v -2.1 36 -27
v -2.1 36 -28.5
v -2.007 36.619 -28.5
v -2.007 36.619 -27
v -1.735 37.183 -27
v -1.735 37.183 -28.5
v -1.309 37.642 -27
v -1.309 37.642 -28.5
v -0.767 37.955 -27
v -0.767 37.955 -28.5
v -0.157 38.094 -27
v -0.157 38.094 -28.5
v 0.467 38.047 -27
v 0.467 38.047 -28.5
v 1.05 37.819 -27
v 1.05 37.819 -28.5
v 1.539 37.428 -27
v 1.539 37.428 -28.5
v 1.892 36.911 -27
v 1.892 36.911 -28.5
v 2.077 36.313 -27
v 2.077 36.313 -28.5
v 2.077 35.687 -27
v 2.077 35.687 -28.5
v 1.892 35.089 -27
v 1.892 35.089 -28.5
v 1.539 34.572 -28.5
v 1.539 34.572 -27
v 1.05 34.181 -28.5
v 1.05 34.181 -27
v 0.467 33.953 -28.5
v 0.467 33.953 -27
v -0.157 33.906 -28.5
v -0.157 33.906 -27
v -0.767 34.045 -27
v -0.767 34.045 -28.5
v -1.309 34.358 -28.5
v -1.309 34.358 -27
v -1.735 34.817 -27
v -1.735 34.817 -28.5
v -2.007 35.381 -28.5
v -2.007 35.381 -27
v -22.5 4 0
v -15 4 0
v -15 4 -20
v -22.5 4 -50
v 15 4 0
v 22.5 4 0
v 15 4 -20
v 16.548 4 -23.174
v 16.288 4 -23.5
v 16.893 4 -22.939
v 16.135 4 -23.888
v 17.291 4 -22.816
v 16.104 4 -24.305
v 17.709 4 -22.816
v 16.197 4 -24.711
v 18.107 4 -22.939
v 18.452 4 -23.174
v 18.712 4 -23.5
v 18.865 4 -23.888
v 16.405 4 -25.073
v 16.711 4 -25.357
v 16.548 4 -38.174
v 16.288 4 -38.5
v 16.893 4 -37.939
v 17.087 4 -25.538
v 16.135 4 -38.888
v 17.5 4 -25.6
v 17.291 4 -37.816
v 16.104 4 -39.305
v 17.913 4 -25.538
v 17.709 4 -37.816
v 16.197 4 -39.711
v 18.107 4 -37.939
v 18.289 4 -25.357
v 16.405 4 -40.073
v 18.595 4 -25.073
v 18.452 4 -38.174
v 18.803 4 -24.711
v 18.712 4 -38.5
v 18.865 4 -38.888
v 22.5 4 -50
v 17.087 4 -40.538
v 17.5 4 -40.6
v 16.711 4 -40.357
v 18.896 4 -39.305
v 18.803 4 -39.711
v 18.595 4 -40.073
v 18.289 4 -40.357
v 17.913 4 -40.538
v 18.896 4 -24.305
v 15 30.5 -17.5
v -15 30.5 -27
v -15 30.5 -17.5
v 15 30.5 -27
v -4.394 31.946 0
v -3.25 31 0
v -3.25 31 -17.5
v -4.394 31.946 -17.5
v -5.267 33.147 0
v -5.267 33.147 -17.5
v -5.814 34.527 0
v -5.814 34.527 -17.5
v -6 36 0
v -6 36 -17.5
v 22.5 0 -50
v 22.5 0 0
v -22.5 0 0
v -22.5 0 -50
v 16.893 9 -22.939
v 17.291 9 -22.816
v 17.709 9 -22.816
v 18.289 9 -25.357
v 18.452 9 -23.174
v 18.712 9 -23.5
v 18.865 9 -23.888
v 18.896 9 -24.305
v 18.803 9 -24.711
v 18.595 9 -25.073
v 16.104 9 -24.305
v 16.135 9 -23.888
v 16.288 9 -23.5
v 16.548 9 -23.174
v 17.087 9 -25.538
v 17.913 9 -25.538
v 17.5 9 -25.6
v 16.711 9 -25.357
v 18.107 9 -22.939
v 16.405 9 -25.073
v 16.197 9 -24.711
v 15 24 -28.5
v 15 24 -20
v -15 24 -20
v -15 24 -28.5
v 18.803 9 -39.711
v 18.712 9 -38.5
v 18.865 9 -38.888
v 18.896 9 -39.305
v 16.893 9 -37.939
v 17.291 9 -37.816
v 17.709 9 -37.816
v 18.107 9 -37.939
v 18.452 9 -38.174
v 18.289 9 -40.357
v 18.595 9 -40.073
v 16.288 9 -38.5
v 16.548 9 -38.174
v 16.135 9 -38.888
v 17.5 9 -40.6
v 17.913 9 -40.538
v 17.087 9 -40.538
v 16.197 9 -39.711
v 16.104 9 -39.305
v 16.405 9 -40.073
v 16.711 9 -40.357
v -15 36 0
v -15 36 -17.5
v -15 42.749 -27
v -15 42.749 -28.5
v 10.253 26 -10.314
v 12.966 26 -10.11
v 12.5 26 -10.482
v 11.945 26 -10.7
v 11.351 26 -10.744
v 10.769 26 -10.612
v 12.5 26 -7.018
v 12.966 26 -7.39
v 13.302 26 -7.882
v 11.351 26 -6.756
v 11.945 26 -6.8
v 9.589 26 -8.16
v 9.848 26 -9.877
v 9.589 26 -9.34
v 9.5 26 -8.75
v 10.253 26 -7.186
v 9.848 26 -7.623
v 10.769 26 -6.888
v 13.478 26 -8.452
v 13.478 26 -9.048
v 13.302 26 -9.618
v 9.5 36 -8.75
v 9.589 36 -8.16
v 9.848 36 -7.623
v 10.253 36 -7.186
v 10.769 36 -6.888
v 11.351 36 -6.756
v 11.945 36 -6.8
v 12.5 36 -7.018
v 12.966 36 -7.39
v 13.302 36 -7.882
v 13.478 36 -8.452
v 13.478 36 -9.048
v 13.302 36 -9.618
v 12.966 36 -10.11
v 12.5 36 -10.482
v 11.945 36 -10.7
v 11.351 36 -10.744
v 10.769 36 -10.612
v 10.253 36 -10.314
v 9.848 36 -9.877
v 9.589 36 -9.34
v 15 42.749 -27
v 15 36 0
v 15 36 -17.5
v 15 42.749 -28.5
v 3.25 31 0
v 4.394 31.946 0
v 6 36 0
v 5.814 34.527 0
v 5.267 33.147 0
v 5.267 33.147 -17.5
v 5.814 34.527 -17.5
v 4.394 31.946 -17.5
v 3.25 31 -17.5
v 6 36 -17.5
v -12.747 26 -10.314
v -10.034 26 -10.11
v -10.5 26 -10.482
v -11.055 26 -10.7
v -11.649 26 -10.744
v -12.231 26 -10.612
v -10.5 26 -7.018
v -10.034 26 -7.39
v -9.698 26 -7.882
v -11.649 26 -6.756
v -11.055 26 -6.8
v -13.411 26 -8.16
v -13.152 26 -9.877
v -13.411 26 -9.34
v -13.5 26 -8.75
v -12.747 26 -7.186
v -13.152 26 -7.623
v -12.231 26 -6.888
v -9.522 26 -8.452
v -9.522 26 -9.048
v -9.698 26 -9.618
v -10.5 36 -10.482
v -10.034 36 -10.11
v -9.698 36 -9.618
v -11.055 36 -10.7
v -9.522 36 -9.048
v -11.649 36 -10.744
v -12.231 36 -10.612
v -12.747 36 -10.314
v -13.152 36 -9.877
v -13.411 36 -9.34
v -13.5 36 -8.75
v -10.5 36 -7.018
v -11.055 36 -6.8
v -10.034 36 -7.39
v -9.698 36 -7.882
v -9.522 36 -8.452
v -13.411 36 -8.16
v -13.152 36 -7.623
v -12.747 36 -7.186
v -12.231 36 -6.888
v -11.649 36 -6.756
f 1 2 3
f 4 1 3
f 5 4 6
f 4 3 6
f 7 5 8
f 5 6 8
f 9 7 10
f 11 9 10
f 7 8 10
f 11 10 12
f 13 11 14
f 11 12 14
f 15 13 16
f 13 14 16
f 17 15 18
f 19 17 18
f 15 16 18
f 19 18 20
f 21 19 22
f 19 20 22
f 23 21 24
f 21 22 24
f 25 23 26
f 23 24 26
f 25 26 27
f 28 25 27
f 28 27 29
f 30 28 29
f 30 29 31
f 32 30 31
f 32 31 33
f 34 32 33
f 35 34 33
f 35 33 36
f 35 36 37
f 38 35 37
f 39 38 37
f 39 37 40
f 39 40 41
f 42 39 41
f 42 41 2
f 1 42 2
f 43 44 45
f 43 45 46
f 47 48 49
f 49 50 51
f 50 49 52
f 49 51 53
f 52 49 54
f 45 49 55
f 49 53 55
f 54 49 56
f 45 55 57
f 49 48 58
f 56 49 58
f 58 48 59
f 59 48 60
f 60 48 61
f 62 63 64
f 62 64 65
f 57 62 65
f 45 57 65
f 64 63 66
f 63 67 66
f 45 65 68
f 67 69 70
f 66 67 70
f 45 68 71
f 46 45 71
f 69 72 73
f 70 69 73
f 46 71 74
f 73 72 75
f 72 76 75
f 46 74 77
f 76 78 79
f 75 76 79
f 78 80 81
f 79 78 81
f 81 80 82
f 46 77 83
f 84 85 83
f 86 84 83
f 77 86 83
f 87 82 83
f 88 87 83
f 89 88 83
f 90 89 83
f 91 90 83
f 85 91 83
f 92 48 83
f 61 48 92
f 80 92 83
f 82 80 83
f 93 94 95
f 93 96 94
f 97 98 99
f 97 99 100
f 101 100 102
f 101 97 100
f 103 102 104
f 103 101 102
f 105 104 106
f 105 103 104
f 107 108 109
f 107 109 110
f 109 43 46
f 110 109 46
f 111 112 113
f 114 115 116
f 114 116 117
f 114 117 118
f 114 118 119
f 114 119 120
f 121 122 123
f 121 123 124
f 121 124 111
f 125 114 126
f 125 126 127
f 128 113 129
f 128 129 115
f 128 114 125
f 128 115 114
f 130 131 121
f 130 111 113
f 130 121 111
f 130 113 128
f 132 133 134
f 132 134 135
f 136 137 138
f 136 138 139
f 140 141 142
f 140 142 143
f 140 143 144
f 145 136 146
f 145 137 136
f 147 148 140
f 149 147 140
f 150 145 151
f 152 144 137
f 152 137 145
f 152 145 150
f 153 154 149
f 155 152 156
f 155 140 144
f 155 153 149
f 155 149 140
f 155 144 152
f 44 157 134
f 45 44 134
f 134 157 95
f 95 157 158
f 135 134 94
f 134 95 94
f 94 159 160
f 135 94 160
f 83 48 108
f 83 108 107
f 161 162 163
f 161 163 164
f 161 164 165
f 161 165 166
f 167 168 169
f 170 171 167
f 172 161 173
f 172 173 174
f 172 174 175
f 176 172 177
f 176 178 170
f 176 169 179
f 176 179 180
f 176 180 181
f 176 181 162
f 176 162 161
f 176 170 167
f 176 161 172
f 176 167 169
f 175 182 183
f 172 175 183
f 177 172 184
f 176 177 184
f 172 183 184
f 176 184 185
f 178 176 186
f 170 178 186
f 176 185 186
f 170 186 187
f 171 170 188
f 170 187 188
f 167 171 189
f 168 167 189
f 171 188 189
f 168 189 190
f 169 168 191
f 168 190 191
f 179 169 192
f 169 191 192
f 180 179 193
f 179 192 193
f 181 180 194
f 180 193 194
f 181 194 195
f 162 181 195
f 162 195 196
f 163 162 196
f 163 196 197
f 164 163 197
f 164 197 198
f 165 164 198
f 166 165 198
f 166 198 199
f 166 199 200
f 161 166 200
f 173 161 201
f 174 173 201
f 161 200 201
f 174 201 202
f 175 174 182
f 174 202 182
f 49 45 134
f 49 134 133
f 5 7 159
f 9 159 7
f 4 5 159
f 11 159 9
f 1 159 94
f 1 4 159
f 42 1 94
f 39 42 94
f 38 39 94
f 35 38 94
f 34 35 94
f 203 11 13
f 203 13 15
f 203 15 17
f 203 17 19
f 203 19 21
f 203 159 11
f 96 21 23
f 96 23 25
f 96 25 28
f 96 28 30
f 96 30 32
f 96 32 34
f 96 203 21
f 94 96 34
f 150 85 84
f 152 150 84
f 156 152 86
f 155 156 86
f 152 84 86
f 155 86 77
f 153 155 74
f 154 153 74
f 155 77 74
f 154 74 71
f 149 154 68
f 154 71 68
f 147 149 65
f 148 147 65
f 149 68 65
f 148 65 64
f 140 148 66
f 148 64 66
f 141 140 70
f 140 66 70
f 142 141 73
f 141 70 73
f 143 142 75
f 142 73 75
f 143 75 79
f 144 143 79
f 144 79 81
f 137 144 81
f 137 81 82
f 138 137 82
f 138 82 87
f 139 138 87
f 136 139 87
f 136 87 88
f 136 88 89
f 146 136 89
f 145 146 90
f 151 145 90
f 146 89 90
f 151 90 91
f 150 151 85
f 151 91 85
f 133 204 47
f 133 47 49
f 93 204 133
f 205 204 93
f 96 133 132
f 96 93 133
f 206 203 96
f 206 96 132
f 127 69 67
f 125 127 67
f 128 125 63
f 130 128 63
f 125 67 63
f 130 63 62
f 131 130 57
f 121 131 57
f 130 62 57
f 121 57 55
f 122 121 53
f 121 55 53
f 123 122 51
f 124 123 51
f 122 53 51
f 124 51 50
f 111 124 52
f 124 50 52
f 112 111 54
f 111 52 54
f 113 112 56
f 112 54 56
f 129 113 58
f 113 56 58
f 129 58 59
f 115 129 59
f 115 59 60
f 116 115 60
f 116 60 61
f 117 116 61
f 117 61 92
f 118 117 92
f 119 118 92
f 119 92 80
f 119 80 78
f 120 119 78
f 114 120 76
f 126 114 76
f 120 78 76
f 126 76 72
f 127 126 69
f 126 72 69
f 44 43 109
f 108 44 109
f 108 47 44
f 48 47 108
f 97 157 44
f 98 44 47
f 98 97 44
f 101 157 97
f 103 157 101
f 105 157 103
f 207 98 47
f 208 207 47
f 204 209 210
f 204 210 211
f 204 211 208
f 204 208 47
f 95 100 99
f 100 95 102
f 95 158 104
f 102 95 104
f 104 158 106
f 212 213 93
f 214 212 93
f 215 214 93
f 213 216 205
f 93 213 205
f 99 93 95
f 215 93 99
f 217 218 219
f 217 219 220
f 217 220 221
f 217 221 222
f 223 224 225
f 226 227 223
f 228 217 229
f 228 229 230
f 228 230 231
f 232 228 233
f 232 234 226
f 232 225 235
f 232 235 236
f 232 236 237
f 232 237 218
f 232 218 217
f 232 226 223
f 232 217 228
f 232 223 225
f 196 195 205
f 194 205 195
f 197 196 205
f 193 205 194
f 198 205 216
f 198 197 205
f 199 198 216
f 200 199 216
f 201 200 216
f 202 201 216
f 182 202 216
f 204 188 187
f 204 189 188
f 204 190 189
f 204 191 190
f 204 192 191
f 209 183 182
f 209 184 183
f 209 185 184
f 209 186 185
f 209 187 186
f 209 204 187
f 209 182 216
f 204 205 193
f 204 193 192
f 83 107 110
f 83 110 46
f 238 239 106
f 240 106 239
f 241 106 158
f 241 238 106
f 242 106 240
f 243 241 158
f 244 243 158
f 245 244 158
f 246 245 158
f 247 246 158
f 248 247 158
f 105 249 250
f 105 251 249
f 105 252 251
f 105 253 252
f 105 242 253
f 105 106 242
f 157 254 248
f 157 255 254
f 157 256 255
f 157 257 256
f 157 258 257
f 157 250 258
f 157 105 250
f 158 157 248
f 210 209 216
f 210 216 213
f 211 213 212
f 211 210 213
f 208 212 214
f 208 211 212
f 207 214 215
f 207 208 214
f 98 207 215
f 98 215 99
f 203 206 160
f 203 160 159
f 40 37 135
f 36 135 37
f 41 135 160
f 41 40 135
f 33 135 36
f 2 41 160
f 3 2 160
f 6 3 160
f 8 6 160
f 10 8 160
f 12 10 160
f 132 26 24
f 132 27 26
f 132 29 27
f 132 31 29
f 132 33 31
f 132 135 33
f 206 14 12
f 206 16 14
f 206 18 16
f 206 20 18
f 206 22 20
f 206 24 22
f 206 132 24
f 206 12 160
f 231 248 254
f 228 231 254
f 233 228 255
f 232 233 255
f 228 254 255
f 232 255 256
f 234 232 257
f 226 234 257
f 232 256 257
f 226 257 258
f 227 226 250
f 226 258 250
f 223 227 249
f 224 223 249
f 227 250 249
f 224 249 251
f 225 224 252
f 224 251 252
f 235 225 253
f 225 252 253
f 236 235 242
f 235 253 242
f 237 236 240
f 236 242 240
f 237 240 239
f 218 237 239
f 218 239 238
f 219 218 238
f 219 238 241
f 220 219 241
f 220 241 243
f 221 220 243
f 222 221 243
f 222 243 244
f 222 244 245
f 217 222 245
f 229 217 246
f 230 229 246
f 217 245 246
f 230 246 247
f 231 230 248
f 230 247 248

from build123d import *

# Parameters (mm, degrees)
SKETCH_2_W          = 50
SKETCH_2_H          = 4
EXTRUDE_2_DEPTH     = 22.5
SKETCH_15_R         = 1.4
EXTRUDE_8_DEPTH     = 5
SKETCH_3_W          = 30
SKETCH_3_H          = 20
EXTRUDE_4_DEPTH     = 20
EXTRUDE_9_DEPTH     = 17.5
EXTRUDE_10_DEPTH    = 15
CUT_EXTRUDE_1_REACH = 58.089
SKETCH_19_R         = 2.1
SKETCH_20_R         = 2
CUT_EXTRUDE_2_DEPTH = 10


with BuildPart() as part:
    # 草圖2 → 填料-伸長2 (new, symmetric)
    with BuildSketch(Plane(origin=(0, 0, 0), x_dir=(0, 0, -1), z_dir=(1, 0, 0))):
        with Locations((25, 2)):
            Rectangle(SKETCH_2_W, SKETCH_2_H)
    extrude(amount=EXTRUDE_2_DEPTH, both=True)

    # 草圖15 → 填料-伸長8 (add)
    with BuildSketch(Plane(origin=(0, 4, 0), x_dir=(1, 0, 0), z_dir=(0, 1, 0))):
        with Locations(Location((17.5, 39.2, 0), (0, 0, 90))):
            Circle(SKETCH_15_R)
        with Locations(Location((17.5, 24.2, 0), (0, 0, 90))):
            Circle(SKETCH_15_R)
    extrude(amount=EXTRUDE_8_DEPTH)

    # 草圖3 → 填料-伸長4 (add)
    with BuildSketch(Plane(origin=(0, 4, 0), x_dir=(1, 0, 0), z_dir=(0, 1, 0))):
        with Locations((0, 10)):
            Rectangle(SKETCH_3_W, SKETCH_3_H)
    extrude(amount=EXTRUDE_4_DEPTH)

    # 草圖16 → 填料-伸長9 (add)
    with BuildSketch(Plane(origin=(0, 0, 0), x_dir=(-1, 0, 0), z_dir=(0, 0, -1))):
        with BuildLine():
            Line((-15, 24), (-15, 36.000002525))
            Line((-15, 36.000002525), (-6, 36.000002525))
            ThreePointArc((-6, 36.000002525), (-5.267141914, 33.146824473), (-3.25, 31.000002525))
            Line((-3.25, 31.000002525), (3.25, 31.000002525))
            ThreePointArc((3.25, 31.000002525), (5.267141914, 33.146824473), (6, 36.000002525))
            Line((6, 36.000002525), (15, 36.000002525))
            Line((15, 36.000002525), (15, 24))
            Line((15, 24), (-15, 24))
        make_face()
    extrude(amount=EXTRUDE_9_DEPTH)

    # 草圖18 → 填料-伸長10 (add, symmetric)
    with BuildSketch(Plane(origin=(0, 0, 0), x_dir=(0, 0, -1), z_dir=(1, 0, 0))):
        Polygon((17.5, 24), (28.5, 24), (28.5, 42.748788628), (27, 42.748788628), (27, 30.5), (17.5, 30.5), align=None)
    extrude(amount=EXTRUDE_10_DEPTH, both=True)

    # 草圖19 → 除料-伸長1 (cut, up to next)
    with BuildSketch(Plane(origin=(0, 0, -28.5), x_dir=(-1, 0, 0), z_dir=(0, 0, -1)), mode=Mode.PRIVATE) as cut_extrude_1_sk1:
        with Locations((0, 36.000002505)):
            Circle(SKETCH_19_R)
    cut_extrude_1_tool1 = extrude(cut_extrude_1_sk1.sketch, amount=-CUT_EXTRUDE_1_REACH, mode=Mode.PRIVATE) & part.part
    add(cut_extrude_1_tool1.solids().sort_by_distance((0, 36.000003, -28.5))[0], mode=Mode.SUBTRACT)

    # 草圖20 → 除料-伸長2 (cut)
    with BuildSketch(Plane(origin=(0, 36.000002525, 0), x_dir=(1, 0, 0), z_dir=(0, 1, 0))):
        with Locations(Location((-11.5, 8.75, 0), (0, 0, 180))):
            Circle(SKETCH_20_R)
        with Locations(Location((11.5, 8.75, 0), (0, 0, 180))):
            Circle(SKETCH_20_R)
    extrude(amount=-CUT_EXTRUDE_2_DEPTH, mode=Mode.SUBTRACT)


solid = part.part
